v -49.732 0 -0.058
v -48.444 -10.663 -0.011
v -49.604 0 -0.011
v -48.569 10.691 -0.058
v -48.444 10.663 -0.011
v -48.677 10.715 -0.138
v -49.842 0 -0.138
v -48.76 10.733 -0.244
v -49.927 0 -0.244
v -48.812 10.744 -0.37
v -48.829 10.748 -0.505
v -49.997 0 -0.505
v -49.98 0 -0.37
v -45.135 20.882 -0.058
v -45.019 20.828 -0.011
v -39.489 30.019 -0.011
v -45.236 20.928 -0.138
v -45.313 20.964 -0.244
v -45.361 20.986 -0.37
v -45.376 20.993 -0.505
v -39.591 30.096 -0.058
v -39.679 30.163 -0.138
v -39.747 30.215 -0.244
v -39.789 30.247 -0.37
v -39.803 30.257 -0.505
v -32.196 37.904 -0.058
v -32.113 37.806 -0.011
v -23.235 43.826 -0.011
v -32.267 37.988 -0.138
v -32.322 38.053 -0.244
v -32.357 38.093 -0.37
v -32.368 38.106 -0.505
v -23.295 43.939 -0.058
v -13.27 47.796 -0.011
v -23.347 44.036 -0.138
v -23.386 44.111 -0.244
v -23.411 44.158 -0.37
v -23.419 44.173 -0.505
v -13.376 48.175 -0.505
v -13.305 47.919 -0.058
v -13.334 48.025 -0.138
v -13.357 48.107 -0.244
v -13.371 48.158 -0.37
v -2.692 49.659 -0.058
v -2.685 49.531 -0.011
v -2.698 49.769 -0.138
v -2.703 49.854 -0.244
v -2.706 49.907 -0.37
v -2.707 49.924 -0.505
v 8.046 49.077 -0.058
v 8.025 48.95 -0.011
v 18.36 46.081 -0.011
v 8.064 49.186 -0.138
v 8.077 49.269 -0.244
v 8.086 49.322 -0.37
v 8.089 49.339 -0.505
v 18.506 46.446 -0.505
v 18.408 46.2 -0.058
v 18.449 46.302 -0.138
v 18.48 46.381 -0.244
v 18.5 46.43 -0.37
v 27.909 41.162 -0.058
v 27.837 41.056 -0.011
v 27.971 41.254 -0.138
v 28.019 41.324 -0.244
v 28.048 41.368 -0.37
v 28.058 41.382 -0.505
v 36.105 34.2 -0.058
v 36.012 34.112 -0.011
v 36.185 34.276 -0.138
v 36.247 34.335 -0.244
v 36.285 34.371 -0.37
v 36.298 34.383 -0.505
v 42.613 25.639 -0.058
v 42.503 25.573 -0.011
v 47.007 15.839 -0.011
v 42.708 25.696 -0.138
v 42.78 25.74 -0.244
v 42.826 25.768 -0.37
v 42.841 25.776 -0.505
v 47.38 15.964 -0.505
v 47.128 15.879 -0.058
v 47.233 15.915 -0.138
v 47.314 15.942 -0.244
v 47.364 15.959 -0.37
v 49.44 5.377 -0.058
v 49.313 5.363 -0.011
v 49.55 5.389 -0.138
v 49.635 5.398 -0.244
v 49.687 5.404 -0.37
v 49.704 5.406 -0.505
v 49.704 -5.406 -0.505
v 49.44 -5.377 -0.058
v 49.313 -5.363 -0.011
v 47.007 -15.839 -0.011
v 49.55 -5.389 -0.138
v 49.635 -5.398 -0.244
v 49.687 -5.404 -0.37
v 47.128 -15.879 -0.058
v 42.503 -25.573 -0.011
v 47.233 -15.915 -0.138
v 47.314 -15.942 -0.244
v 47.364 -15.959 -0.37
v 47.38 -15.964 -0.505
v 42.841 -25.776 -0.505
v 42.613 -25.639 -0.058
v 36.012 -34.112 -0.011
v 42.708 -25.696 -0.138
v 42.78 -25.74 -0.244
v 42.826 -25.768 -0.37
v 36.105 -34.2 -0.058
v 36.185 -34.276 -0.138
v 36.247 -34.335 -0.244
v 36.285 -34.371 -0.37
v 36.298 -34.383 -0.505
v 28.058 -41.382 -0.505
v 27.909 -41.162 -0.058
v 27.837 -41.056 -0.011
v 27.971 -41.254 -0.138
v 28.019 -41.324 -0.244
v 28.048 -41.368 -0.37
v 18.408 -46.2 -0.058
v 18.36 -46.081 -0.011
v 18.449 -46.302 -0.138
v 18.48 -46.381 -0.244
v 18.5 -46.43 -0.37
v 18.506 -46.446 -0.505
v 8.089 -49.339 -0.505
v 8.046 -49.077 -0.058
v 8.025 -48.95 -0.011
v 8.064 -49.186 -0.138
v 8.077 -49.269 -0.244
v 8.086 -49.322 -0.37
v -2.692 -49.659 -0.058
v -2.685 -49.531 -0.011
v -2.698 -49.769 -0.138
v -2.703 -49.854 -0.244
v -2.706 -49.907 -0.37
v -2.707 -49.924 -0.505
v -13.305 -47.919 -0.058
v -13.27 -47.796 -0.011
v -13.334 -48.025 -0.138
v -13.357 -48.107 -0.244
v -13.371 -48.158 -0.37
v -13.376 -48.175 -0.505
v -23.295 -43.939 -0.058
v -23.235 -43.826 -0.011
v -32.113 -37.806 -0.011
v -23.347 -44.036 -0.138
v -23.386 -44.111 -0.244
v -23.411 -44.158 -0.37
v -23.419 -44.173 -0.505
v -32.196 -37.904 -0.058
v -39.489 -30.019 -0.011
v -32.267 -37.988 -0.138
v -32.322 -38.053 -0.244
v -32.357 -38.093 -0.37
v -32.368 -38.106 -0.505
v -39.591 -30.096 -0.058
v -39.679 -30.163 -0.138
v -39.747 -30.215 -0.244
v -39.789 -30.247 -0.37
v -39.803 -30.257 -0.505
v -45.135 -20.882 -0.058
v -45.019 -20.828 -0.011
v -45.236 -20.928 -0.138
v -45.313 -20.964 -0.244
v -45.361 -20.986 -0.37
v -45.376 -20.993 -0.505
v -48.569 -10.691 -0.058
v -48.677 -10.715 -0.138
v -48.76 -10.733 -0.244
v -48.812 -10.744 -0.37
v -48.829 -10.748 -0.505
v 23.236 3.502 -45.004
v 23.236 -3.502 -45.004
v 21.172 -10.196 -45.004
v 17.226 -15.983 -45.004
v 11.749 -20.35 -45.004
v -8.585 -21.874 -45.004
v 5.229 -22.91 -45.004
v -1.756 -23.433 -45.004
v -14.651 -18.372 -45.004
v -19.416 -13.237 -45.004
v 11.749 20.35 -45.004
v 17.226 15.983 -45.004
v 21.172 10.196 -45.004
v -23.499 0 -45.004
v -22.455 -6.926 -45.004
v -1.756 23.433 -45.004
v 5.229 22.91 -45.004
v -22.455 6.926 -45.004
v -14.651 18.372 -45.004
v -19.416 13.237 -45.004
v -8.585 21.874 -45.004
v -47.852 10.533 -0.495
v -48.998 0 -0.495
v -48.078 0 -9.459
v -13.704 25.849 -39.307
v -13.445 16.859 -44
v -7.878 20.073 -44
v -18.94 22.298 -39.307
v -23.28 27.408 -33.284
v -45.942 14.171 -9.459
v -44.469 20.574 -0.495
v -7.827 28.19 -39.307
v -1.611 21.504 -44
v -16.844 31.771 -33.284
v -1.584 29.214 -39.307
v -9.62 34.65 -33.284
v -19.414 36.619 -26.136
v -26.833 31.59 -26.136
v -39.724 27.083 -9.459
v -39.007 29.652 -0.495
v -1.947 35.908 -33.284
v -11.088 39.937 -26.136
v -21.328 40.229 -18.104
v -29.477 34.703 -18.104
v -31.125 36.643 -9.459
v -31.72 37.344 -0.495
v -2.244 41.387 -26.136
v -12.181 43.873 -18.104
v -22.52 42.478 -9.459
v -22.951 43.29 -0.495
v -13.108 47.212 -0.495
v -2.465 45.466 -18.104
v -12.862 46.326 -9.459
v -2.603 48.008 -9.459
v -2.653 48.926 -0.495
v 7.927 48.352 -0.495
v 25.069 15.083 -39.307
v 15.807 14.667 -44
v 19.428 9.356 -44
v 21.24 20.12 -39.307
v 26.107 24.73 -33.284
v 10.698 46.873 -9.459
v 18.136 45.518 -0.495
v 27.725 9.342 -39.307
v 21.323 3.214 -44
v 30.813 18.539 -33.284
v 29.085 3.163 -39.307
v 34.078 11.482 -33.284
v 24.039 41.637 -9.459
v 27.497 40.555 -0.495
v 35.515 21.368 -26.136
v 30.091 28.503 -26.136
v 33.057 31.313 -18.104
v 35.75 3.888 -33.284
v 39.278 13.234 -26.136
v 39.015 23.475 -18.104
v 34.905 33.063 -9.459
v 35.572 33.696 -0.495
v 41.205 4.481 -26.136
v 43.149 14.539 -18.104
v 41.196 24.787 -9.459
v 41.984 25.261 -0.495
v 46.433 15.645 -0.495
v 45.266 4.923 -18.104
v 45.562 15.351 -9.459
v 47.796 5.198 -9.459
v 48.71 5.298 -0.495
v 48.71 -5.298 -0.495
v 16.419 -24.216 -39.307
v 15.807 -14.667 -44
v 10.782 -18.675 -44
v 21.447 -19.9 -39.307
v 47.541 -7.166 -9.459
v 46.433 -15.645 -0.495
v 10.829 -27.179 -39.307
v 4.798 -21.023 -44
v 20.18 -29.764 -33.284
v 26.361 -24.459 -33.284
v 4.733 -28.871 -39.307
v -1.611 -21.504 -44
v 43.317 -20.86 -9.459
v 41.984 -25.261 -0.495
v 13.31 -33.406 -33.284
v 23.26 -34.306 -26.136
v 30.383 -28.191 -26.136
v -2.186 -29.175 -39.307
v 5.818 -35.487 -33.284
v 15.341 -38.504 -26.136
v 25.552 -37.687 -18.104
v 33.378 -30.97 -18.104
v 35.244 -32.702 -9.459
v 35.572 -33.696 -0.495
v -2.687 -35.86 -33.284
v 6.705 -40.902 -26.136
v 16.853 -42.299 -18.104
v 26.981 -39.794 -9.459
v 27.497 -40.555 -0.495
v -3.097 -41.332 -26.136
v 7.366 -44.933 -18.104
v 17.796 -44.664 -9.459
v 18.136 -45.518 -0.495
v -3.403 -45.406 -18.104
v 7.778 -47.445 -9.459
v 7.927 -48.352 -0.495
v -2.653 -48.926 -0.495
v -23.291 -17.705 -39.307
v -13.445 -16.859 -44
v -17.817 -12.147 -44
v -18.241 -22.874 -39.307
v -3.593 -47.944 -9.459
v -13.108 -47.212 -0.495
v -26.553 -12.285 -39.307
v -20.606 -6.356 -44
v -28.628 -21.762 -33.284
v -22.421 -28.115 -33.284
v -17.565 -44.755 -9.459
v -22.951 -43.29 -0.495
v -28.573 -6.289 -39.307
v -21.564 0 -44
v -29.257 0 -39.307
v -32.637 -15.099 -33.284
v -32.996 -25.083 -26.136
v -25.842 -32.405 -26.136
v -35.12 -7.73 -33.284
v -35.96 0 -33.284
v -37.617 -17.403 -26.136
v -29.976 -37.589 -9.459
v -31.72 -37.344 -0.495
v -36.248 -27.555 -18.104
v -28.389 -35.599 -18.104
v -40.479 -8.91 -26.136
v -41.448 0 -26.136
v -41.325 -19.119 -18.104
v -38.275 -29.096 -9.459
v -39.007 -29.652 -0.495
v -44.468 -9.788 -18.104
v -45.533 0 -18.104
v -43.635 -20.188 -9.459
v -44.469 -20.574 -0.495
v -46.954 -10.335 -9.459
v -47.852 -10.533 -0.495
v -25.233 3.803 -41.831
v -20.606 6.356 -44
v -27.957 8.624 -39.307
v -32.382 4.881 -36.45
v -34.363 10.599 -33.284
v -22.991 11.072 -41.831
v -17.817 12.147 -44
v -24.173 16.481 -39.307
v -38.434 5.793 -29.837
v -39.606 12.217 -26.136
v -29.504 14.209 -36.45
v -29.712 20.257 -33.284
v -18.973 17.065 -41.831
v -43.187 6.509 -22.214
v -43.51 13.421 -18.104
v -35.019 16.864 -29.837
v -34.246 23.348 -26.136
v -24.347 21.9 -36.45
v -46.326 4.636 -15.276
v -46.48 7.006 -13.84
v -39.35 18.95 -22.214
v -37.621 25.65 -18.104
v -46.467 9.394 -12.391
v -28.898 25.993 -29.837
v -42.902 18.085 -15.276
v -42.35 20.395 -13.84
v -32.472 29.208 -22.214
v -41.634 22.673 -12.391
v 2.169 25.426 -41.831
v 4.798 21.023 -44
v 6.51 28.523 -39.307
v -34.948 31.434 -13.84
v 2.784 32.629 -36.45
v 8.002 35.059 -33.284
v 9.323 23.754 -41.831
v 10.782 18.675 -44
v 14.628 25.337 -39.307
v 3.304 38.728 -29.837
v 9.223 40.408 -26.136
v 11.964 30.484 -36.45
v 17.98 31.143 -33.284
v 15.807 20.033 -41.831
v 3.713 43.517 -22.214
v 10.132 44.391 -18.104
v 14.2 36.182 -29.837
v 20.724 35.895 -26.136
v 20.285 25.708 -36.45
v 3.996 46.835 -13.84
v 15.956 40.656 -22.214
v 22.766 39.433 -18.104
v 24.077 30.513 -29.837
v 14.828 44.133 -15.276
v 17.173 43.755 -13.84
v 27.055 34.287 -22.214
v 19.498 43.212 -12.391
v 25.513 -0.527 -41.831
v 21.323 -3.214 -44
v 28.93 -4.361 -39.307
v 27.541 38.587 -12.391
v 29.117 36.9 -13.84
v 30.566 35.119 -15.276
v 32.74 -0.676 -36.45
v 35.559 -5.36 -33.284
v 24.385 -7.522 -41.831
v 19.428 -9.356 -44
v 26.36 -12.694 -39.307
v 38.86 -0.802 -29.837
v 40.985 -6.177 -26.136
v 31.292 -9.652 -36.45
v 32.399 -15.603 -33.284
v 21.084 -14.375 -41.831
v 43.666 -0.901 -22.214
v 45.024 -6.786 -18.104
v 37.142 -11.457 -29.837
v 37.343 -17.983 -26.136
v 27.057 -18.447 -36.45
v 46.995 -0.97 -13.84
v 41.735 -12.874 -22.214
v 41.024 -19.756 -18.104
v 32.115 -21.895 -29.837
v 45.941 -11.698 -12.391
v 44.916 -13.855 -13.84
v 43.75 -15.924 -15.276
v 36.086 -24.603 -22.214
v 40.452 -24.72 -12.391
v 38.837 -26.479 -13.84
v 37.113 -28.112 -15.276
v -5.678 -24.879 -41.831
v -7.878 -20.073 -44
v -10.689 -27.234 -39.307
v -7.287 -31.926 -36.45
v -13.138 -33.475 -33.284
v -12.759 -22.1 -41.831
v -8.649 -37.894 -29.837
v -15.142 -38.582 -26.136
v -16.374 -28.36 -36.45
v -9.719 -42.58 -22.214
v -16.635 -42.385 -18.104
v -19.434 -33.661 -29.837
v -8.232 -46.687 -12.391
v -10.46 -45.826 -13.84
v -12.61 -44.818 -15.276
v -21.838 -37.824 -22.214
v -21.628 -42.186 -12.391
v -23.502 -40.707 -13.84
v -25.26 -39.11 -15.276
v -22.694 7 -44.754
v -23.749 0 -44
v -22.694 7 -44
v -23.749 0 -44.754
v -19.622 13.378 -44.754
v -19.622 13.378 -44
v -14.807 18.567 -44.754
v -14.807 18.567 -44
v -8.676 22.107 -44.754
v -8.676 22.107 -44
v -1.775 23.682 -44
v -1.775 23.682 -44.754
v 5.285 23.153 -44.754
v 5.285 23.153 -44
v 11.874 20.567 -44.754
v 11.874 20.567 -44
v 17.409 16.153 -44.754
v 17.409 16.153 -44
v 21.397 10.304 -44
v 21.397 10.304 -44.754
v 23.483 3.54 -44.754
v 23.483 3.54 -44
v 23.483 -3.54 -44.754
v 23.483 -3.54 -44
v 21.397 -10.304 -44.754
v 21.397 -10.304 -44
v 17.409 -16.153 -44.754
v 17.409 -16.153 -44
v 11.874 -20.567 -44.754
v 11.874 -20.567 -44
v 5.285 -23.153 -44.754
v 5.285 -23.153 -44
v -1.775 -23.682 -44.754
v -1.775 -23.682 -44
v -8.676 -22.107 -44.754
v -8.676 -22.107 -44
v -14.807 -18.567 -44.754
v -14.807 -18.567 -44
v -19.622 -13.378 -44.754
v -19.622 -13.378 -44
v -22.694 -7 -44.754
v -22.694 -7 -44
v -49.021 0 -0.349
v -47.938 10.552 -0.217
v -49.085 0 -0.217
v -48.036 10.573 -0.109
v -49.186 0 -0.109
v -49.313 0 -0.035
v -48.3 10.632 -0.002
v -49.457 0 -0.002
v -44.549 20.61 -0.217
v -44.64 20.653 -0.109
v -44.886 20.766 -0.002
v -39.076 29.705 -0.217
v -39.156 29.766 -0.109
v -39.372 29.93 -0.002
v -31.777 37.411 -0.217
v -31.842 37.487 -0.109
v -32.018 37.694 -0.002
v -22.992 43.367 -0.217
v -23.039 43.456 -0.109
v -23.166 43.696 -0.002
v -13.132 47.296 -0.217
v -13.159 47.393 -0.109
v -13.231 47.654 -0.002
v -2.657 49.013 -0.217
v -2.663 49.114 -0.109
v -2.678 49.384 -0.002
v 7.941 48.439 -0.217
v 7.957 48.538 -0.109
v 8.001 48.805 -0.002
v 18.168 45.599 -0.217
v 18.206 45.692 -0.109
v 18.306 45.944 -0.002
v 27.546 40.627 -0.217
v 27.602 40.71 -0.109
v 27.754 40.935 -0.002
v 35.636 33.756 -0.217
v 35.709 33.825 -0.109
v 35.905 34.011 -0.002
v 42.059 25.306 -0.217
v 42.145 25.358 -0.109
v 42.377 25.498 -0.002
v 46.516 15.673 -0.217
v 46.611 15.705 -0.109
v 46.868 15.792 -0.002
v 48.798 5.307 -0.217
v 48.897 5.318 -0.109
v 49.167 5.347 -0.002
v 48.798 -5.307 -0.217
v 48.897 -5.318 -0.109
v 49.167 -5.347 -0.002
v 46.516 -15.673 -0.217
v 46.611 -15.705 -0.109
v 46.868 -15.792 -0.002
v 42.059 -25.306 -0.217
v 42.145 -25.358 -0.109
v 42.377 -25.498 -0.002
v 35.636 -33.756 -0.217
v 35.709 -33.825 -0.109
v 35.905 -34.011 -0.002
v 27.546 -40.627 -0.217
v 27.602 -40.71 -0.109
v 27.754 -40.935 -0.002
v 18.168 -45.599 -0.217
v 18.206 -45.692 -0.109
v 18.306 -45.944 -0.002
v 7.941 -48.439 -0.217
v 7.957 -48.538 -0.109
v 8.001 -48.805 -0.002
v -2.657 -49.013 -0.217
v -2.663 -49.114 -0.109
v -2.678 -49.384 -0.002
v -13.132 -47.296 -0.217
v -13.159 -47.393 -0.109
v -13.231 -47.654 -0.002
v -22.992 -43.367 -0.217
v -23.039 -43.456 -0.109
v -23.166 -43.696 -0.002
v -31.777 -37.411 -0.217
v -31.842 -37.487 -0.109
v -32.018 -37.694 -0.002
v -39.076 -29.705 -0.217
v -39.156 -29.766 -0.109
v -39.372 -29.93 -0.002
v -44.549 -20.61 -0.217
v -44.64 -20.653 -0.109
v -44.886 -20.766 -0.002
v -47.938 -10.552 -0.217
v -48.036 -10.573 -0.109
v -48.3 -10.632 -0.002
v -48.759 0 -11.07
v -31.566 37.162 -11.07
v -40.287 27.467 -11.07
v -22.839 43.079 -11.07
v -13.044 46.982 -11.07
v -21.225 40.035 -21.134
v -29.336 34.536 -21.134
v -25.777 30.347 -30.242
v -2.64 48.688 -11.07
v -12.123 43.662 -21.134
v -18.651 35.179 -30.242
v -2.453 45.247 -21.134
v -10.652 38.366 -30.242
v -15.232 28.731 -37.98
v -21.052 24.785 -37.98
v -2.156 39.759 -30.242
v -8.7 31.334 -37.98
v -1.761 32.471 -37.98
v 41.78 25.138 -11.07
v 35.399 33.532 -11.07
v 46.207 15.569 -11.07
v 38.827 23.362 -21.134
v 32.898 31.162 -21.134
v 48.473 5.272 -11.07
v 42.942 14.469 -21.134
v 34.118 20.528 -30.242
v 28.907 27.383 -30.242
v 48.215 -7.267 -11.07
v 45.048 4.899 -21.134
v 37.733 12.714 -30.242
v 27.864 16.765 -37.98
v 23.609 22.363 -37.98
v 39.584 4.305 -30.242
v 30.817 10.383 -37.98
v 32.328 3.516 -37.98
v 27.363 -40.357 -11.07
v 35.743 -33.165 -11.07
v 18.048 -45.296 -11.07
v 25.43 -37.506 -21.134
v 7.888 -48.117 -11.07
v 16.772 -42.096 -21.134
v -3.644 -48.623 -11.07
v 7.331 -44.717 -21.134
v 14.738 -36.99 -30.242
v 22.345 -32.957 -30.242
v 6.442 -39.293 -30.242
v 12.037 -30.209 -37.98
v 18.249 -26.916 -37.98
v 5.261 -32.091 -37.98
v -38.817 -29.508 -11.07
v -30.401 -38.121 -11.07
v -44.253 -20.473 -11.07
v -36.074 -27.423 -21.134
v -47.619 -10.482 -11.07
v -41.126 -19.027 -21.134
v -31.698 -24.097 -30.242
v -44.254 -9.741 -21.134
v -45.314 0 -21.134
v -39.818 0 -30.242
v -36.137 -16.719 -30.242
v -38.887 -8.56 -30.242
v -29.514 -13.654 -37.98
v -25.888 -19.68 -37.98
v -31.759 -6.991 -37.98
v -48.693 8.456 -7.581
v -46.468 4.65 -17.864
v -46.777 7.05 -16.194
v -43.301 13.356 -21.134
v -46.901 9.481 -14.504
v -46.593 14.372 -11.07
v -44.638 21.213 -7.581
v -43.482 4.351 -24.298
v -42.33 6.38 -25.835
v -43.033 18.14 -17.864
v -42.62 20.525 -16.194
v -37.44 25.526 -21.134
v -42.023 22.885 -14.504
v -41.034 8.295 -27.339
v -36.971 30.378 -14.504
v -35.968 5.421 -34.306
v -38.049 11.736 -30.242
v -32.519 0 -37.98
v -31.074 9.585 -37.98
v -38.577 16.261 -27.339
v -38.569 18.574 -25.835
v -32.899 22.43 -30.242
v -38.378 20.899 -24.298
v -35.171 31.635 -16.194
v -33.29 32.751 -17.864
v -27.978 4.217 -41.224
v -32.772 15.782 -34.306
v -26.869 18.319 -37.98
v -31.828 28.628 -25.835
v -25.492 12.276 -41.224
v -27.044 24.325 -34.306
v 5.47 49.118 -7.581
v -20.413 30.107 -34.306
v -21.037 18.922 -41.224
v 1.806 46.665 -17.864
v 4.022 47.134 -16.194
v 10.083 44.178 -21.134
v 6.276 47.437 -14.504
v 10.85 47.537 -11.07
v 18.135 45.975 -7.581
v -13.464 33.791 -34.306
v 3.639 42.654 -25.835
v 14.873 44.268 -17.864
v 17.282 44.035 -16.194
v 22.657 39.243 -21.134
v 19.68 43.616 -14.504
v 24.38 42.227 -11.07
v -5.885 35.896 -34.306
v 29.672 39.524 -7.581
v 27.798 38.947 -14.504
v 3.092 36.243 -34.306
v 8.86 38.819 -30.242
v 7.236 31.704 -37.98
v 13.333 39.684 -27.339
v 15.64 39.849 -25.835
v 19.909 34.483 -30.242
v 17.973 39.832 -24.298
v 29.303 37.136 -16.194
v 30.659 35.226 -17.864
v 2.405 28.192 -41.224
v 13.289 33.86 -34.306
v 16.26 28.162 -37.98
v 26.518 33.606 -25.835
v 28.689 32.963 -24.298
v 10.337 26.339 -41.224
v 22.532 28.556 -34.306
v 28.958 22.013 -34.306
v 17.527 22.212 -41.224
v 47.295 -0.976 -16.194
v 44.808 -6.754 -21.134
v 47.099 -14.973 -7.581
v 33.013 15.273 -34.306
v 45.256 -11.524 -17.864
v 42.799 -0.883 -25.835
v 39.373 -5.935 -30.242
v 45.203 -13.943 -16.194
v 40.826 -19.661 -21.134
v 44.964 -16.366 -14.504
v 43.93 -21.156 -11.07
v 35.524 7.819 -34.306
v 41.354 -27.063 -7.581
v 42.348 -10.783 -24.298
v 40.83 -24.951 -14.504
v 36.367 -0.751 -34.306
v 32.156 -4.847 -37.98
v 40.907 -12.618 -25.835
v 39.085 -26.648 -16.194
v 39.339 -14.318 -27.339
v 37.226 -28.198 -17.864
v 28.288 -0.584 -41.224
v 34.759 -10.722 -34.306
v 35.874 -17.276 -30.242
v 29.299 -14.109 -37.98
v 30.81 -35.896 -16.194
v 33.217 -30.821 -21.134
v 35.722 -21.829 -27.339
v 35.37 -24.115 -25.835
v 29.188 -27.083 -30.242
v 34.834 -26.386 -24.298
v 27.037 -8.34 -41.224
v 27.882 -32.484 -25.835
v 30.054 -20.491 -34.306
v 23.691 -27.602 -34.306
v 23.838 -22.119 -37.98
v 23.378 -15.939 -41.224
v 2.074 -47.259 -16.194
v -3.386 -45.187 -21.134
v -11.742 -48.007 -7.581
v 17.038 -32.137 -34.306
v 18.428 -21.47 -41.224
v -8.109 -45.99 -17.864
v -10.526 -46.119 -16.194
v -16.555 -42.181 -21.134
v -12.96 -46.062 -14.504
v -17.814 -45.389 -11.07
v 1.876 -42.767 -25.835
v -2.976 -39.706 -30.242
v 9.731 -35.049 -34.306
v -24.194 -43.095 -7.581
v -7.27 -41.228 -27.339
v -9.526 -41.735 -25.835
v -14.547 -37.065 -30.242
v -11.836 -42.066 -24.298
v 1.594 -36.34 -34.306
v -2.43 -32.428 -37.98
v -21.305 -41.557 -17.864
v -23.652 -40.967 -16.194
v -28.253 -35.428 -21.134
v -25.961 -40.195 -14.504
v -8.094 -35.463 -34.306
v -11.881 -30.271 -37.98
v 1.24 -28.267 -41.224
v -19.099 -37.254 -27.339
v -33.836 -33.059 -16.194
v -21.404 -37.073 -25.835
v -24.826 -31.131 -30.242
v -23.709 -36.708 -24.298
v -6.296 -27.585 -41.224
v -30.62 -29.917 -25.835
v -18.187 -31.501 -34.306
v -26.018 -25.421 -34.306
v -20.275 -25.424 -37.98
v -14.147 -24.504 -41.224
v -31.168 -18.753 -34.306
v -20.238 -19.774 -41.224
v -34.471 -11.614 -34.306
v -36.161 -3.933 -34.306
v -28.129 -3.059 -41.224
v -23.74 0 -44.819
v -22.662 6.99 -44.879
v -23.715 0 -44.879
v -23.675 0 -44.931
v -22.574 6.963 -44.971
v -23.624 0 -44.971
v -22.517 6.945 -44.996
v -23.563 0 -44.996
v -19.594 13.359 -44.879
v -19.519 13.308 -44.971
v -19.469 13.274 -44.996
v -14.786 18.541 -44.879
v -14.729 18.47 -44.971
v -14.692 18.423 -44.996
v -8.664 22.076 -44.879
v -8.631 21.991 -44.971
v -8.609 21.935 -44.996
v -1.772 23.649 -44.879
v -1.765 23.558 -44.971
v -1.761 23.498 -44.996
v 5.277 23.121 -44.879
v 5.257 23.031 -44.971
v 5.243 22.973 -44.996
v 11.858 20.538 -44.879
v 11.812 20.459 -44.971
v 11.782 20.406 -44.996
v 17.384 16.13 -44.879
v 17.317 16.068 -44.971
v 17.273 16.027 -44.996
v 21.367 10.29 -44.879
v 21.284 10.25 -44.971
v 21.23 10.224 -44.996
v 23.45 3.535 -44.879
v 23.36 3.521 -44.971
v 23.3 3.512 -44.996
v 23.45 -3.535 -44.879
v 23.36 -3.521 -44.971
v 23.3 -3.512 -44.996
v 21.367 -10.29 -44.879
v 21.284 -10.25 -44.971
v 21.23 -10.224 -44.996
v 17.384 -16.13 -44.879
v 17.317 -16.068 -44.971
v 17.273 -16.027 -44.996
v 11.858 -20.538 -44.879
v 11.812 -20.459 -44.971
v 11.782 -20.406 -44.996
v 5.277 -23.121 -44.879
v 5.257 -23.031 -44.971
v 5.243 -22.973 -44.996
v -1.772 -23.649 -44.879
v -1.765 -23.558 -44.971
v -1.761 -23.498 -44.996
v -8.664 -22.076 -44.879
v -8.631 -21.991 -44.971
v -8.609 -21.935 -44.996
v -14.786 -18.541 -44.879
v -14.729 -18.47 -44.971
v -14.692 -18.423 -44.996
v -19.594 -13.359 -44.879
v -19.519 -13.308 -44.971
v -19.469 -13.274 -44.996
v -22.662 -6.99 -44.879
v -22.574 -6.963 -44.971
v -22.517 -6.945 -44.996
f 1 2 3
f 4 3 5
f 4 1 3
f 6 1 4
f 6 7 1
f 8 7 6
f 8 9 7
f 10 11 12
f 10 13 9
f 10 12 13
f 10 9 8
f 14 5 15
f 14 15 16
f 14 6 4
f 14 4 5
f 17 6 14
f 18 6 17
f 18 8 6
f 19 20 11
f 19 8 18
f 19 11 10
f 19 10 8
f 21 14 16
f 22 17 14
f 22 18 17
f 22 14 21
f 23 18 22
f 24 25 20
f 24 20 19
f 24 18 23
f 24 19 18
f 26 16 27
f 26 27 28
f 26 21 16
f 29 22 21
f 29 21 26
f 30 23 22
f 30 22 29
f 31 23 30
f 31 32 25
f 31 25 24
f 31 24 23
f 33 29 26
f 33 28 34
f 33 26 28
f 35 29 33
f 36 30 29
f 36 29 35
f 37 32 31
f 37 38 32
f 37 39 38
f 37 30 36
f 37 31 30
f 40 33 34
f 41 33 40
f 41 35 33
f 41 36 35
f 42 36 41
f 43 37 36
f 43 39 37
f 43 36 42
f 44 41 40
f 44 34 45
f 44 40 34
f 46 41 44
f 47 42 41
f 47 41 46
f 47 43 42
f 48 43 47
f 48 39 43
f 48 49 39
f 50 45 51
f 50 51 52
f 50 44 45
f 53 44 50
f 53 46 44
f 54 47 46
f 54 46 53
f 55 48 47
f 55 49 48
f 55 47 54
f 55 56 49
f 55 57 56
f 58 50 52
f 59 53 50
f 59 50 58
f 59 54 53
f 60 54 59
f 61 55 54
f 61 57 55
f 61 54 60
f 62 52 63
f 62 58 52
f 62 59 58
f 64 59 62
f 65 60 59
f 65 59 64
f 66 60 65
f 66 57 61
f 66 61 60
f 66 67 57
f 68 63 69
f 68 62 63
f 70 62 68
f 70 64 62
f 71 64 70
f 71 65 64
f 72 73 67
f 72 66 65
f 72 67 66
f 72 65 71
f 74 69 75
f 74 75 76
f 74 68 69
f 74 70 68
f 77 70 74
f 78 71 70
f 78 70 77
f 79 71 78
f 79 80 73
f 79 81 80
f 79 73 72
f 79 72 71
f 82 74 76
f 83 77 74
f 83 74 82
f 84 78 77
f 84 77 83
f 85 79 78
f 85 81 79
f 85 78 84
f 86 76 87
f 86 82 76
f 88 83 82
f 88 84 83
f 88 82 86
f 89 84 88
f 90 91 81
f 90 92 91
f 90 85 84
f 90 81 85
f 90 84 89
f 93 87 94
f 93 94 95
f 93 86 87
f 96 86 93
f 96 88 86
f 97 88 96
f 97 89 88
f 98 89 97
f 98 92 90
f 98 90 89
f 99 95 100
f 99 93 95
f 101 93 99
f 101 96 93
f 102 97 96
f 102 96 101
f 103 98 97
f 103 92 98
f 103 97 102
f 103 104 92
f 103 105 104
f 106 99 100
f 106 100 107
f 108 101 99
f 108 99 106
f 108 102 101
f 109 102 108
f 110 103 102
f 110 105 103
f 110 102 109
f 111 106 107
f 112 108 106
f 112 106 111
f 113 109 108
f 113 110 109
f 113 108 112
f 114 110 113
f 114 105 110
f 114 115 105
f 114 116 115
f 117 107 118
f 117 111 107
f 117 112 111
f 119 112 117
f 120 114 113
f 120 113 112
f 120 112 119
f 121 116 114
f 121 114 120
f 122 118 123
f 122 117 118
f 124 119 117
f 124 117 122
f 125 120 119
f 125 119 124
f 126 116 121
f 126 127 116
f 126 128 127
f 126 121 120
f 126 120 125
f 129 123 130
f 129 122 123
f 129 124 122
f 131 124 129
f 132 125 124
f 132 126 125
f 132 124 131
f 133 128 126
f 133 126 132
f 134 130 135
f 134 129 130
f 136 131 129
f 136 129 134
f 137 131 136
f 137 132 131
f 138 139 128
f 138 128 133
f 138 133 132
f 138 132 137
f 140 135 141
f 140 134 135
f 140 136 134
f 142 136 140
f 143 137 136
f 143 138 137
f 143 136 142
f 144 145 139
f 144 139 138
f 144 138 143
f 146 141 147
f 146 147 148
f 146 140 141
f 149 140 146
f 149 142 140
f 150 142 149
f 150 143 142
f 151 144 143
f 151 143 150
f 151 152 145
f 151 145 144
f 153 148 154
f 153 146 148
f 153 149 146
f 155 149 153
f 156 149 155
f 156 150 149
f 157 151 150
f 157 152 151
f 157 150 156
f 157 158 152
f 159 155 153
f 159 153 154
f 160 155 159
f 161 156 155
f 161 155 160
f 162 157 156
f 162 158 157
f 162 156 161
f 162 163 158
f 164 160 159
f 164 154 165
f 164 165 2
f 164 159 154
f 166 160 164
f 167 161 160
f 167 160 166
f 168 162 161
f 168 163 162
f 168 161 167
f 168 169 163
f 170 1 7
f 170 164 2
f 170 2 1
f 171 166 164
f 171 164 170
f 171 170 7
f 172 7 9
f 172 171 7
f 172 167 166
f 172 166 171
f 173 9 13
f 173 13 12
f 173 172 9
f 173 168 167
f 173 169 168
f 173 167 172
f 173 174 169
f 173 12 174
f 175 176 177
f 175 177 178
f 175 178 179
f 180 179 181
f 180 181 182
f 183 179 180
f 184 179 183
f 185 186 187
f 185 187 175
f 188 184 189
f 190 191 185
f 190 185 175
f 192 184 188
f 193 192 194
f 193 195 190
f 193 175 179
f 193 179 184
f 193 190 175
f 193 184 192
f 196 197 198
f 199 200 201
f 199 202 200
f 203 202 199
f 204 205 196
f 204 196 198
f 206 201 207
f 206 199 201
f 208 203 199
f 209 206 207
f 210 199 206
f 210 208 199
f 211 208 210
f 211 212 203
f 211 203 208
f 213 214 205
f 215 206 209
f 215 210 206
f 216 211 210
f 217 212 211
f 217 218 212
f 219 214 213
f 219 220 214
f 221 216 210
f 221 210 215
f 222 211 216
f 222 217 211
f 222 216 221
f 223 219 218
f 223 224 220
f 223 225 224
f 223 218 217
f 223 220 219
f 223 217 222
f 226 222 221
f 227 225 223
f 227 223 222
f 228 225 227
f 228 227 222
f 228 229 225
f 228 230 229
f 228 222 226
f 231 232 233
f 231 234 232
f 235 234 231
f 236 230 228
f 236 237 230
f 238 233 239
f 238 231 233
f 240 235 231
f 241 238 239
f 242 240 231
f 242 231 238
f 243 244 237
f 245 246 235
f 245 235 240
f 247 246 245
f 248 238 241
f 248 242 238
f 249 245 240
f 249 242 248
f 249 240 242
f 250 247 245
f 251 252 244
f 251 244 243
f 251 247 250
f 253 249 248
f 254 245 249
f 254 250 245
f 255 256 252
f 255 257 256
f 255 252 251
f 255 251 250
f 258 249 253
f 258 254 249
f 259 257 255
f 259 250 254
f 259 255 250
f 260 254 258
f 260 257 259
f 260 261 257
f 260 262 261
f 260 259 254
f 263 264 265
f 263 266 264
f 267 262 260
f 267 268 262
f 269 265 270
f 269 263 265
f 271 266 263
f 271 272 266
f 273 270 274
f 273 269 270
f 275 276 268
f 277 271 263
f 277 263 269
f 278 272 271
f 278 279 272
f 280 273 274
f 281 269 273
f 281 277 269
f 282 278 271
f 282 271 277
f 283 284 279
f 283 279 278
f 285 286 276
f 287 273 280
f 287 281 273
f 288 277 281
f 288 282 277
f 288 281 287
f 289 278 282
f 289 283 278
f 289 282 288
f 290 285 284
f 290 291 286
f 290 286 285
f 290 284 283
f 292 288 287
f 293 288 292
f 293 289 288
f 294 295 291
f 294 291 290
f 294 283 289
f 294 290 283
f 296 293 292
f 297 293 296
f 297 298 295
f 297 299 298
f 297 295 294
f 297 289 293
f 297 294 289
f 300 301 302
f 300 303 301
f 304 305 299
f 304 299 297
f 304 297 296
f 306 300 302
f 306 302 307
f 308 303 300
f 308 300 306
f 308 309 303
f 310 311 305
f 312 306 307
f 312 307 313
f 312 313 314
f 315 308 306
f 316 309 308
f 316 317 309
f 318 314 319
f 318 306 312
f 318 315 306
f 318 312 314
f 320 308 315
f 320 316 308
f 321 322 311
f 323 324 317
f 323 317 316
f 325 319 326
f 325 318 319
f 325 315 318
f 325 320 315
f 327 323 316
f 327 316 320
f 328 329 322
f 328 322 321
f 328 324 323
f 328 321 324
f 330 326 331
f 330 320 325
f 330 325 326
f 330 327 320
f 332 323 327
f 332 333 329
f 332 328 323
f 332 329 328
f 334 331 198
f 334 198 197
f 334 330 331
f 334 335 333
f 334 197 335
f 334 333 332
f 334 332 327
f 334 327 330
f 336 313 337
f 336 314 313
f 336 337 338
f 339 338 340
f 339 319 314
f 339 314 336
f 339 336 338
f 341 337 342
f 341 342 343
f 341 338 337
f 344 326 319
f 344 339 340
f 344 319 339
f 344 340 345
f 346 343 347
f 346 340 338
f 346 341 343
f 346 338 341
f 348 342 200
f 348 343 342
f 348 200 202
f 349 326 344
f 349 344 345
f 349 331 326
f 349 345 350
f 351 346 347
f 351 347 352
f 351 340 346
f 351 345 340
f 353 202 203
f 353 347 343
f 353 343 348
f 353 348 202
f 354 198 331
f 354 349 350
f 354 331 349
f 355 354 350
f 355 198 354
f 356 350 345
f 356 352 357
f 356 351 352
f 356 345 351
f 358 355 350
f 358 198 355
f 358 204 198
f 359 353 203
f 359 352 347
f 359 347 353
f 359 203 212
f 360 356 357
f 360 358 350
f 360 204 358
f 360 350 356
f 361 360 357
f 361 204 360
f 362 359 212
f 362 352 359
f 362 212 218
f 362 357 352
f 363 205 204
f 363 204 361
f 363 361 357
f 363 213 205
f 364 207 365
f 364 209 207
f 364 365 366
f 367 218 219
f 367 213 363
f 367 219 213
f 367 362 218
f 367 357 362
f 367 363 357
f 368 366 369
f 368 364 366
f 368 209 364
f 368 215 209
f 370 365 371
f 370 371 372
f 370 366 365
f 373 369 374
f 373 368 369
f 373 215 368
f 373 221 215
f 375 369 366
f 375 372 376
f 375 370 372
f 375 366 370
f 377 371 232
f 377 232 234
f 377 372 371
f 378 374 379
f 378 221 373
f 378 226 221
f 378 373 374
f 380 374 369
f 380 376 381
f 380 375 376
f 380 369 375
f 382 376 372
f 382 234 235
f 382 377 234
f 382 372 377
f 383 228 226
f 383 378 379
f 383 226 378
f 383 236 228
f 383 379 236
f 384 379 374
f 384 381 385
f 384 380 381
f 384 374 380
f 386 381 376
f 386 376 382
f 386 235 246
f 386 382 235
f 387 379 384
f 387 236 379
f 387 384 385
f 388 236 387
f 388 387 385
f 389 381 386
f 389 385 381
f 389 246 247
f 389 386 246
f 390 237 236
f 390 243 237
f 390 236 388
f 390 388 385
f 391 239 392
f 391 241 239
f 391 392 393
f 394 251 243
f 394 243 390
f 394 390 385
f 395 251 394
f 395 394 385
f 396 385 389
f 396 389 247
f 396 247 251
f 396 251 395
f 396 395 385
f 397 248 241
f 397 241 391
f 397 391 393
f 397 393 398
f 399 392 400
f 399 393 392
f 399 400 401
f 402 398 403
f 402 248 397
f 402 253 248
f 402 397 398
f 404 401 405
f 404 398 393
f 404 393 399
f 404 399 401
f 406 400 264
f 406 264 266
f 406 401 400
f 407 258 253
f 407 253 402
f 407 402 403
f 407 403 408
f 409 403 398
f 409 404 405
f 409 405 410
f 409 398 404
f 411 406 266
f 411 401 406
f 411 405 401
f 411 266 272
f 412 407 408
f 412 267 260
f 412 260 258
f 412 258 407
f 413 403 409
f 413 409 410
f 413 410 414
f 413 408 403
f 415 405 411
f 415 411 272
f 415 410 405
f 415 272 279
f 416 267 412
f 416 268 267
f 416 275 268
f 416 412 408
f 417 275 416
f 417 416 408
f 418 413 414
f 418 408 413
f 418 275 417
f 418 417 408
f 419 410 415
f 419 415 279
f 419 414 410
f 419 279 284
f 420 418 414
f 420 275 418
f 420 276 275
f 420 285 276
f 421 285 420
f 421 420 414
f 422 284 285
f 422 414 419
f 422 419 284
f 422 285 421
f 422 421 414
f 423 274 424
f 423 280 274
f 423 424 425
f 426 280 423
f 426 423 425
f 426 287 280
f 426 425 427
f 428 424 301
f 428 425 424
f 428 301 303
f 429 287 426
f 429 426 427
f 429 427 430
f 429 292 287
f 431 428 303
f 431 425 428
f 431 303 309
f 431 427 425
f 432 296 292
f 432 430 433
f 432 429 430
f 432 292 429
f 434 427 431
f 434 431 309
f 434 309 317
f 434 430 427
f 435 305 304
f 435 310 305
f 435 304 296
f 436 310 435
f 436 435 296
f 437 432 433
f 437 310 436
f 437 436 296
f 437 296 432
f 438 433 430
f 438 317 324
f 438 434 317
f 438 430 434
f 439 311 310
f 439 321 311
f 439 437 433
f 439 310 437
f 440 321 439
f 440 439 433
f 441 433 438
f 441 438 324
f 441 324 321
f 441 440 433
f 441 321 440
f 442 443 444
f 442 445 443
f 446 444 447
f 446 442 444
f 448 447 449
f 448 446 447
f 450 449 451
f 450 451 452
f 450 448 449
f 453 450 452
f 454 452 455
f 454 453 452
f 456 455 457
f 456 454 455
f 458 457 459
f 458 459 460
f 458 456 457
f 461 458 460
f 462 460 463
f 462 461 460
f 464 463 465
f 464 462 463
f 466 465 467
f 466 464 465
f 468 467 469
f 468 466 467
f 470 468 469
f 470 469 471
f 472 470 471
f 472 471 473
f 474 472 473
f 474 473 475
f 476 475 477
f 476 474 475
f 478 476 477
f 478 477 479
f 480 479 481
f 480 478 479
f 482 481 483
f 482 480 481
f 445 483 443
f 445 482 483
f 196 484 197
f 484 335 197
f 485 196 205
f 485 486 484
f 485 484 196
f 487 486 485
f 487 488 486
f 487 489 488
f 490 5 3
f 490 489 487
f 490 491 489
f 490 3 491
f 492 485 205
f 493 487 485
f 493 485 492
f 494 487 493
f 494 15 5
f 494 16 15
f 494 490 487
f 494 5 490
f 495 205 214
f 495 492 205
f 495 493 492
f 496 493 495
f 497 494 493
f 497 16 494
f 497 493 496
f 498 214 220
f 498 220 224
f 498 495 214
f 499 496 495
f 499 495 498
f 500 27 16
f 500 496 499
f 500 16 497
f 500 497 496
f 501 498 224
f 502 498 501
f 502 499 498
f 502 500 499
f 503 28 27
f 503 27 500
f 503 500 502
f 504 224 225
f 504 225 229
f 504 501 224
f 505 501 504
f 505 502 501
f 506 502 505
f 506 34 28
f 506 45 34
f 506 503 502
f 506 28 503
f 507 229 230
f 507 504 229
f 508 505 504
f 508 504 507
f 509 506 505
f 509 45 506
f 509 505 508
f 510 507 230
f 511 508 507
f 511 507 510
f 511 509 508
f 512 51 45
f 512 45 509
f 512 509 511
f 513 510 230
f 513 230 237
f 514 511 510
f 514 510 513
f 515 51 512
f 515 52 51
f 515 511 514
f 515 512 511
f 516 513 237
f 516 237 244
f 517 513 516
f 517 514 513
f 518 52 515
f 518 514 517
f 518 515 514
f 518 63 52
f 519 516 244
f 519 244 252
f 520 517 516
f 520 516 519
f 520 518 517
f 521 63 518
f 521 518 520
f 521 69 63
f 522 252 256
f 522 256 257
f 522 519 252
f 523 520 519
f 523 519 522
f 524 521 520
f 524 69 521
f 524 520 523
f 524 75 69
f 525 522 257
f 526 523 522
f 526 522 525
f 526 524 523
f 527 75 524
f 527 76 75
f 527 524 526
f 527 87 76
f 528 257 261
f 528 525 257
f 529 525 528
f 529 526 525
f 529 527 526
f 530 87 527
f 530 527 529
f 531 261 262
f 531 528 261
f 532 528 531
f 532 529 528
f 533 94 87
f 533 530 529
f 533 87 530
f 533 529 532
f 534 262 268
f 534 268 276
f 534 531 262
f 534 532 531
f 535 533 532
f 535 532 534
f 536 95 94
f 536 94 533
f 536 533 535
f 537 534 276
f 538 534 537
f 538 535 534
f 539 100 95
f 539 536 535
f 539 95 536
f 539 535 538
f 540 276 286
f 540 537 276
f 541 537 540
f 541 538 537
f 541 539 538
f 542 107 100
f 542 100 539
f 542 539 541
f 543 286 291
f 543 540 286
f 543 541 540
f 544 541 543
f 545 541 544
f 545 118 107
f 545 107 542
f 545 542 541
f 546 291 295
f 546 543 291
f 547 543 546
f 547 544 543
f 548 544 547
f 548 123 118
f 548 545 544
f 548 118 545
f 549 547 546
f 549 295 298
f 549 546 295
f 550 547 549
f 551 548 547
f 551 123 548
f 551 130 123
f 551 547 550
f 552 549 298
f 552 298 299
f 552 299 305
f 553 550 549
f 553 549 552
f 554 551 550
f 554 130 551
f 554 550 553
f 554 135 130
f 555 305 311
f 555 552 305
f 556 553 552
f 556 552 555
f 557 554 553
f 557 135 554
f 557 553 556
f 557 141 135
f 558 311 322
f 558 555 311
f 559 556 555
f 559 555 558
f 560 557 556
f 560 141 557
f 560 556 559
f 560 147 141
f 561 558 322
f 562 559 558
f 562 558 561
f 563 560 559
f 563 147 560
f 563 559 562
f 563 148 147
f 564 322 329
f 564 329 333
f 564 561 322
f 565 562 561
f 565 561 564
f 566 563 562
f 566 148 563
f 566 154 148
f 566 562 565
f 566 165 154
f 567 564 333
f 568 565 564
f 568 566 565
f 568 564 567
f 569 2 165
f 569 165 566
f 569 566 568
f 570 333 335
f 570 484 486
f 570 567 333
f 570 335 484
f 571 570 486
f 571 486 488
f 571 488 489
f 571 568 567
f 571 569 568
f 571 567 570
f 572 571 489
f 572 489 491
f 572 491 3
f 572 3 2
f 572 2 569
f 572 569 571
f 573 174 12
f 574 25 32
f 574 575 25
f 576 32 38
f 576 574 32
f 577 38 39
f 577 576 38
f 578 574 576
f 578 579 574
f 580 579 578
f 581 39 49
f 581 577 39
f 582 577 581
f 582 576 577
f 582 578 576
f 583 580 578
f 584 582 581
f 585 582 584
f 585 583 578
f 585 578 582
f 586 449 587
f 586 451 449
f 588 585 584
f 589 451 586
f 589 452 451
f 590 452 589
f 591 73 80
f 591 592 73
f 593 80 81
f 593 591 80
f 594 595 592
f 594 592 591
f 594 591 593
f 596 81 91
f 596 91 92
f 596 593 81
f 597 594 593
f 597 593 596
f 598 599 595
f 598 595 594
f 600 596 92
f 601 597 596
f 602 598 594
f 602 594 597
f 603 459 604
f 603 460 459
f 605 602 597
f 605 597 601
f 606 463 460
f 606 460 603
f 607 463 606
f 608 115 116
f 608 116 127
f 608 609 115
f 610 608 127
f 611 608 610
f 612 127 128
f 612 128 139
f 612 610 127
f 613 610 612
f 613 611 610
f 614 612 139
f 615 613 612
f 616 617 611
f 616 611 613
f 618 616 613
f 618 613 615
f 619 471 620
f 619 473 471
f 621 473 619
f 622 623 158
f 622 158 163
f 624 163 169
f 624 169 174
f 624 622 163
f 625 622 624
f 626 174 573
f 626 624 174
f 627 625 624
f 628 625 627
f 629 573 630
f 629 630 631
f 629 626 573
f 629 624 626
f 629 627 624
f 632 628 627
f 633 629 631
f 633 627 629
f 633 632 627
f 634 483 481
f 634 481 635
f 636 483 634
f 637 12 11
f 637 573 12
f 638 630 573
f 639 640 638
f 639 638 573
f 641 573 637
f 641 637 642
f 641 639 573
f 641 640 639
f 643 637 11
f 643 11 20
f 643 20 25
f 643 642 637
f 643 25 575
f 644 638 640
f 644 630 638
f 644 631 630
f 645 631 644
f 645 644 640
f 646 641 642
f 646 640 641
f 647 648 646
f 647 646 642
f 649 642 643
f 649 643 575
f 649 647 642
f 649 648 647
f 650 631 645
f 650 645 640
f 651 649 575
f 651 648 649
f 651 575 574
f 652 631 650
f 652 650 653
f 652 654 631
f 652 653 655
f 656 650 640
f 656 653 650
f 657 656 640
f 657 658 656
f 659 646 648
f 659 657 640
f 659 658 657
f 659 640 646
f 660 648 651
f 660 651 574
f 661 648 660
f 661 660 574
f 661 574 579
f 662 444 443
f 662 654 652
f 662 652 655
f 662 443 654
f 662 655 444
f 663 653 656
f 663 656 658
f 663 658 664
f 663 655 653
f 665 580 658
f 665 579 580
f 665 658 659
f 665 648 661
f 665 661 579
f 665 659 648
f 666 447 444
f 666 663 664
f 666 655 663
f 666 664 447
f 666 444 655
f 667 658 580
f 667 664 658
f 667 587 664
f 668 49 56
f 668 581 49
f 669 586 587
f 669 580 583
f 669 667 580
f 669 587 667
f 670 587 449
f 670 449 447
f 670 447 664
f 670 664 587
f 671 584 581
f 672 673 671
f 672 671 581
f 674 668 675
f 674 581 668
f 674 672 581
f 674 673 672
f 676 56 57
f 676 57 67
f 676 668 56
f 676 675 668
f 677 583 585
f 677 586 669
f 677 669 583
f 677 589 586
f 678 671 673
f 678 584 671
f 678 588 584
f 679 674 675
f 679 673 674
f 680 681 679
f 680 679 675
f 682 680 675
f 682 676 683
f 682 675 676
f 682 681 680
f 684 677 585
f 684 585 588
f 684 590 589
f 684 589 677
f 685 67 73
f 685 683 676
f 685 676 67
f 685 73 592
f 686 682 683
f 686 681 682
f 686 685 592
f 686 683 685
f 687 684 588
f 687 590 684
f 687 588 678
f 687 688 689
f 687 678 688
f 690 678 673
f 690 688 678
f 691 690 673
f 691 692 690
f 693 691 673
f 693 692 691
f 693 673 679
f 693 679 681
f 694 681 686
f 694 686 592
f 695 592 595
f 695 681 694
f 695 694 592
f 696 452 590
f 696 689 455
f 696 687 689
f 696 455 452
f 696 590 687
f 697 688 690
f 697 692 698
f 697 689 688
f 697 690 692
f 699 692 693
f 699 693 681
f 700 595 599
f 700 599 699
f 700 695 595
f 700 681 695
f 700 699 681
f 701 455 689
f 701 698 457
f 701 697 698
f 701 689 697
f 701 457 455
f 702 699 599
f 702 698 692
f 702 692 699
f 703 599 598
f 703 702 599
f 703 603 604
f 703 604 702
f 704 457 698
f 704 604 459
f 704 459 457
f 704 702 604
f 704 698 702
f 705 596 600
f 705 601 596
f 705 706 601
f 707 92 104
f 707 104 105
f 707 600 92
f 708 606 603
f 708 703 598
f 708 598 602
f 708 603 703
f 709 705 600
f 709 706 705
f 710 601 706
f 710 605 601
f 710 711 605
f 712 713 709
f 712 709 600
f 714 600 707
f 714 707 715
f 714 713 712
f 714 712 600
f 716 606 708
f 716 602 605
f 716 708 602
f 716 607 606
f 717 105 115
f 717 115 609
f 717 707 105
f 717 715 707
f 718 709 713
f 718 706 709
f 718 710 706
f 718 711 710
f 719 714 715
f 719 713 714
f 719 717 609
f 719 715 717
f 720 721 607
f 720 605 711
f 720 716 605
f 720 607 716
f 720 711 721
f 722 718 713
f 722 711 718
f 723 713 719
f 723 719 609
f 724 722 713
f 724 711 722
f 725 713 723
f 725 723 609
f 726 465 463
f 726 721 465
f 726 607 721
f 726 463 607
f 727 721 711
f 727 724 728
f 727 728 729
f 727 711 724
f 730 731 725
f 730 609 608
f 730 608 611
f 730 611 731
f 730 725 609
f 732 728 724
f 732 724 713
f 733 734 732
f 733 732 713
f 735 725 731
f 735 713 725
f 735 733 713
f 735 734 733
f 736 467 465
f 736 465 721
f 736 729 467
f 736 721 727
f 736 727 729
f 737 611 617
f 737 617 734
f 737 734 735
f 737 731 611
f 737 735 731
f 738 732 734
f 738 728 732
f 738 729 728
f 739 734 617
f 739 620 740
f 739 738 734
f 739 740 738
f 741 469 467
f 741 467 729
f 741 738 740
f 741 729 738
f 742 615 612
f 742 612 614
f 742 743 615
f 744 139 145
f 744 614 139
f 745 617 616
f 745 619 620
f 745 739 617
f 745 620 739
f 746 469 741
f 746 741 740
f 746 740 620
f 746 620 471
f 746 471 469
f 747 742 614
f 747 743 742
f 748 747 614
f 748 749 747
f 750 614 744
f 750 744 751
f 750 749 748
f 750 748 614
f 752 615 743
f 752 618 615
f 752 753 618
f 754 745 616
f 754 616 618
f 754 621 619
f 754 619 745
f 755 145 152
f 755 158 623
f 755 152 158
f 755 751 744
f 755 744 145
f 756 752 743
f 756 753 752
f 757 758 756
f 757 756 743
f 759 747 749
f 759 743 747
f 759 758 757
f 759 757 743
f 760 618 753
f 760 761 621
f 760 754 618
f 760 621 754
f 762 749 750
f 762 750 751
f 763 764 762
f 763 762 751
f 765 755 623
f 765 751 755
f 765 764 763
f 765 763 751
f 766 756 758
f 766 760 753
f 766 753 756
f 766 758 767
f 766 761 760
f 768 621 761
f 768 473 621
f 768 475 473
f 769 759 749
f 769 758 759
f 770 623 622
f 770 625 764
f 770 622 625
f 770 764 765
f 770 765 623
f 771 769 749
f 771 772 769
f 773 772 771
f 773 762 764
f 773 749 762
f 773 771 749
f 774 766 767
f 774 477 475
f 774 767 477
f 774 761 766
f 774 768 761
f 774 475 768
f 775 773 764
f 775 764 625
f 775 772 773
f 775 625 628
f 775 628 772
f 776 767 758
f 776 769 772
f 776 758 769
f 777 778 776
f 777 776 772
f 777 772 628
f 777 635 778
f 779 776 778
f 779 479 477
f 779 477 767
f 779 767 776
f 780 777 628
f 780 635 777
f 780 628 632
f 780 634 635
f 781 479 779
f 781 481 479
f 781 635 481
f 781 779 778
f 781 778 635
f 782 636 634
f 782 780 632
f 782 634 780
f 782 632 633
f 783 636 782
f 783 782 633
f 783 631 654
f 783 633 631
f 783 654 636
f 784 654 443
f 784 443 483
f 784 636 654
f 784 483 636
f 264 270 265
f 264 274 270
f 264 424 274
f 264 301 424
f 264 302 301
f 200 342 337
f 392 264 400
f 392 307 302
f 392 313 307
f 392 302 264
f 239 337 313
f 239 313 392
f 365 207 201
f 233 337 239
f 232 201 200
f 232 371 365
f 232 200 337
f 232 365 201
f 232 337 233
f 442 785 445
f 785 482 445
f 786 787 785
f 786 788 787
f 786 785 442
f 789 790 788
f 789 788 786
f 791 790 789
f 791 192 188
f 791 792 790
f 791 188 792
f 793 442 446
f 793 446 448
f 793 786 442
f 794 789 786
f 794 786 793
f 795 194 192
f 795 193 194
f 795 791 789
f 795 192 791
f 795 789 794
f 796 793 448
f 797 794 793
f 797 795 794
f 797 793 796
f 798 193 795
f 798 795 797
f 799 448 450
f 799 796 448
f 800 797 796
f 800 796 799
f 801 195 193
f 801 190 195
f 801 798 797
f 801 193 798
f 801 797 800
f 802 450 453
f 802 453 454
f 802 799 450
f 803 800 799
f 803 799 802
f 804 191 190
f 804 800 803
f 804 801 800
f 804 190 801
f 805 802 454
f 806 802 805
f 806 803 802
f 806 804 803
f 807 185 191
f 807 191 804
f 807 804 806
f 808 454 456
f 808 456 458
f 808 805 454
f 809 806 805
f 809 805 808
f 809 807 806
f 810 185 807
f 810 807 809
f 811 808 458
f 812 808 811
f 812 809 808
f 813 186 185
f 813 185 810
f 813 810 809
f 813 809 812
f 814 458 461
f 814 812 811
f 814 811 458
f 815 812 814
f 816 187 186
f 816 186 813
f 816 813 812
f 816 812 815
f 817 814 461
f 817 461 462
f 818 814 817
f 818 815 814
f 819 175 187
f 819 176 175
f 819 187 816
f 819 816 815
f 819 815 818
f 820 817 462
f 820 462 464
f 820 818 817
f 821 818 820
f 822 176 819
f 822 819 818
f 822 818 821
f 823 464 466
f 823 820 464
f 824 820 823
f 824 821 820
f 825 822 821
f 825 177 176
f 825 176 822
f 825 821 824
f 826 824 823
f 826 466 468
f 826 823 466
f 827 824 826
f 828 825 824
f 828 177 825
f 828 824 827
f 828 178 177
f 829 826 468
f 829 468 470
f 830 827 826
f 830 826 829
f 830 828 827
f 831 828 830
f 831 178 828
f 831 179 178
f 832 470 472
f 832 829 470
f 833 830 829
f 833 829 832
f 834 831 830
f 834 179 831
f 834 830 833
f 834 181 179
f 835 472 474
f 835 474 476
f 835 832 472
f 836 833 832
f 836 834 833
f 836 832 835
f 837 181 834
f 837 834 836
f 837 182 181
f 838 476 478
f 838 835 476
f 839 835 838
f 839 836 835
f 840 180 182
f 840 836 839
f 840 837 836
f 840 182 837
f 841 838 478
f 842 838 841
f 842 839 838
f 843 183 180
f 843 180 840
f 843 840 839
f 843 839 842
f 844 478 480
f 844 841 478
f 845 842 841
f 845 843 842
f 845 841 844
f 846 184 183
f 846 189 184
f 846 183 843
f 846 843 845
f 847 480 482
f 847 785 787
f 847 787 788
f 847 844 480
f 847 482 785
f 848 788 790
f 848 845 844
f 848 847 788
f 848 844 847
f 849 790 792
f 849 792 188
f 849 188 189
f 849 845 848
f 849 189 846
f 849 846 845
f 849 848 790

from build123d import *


with BuildPart() as f1:
    # F0 (on Front) → F1 (revolve)
    with BuildSketch(Plane.XZ):
        with BuildLine():
            ThreePointArc((-49.603742, -0.011423), (-49.88837, -0.18823), (-49.997449, -0.505051))
            ThreePointArc((-49.997449, -0.505051), (-42.808594, -25.834556), (-23.748684, -44))
            Line((-23.748684, -44), (-21.563859, -44))
            ThreePointArc((-21.563859, -44), (-41.447541, -26.136207), (-48.9975, -0.494949))
            ThreePointArc((-48.9975, -0.494949), (-49.185704, -0.109105), (-49.603742, -0.011423))
        make_face()
        with BuildLine():
            Line((-21.563859, -44), (-23.748684, -44))
            Line((-23.748684, -44), (-23.748684, -44.754309))
            ThreePointArc((-23.748684, -44.754309), (-23.675461, -44.931086), (-23.498684, -45.004309))
            Line((-23.498684, -45.004309), (0, -45.004309))
            Line((0, -45.004309), (0, -44))
            Line((0, -44), (-21.563859, -44))
        make_face()
    revolve(axis=Axis((0, 0, -6.897418), (0, 0, -1)))


solid = f1.part
